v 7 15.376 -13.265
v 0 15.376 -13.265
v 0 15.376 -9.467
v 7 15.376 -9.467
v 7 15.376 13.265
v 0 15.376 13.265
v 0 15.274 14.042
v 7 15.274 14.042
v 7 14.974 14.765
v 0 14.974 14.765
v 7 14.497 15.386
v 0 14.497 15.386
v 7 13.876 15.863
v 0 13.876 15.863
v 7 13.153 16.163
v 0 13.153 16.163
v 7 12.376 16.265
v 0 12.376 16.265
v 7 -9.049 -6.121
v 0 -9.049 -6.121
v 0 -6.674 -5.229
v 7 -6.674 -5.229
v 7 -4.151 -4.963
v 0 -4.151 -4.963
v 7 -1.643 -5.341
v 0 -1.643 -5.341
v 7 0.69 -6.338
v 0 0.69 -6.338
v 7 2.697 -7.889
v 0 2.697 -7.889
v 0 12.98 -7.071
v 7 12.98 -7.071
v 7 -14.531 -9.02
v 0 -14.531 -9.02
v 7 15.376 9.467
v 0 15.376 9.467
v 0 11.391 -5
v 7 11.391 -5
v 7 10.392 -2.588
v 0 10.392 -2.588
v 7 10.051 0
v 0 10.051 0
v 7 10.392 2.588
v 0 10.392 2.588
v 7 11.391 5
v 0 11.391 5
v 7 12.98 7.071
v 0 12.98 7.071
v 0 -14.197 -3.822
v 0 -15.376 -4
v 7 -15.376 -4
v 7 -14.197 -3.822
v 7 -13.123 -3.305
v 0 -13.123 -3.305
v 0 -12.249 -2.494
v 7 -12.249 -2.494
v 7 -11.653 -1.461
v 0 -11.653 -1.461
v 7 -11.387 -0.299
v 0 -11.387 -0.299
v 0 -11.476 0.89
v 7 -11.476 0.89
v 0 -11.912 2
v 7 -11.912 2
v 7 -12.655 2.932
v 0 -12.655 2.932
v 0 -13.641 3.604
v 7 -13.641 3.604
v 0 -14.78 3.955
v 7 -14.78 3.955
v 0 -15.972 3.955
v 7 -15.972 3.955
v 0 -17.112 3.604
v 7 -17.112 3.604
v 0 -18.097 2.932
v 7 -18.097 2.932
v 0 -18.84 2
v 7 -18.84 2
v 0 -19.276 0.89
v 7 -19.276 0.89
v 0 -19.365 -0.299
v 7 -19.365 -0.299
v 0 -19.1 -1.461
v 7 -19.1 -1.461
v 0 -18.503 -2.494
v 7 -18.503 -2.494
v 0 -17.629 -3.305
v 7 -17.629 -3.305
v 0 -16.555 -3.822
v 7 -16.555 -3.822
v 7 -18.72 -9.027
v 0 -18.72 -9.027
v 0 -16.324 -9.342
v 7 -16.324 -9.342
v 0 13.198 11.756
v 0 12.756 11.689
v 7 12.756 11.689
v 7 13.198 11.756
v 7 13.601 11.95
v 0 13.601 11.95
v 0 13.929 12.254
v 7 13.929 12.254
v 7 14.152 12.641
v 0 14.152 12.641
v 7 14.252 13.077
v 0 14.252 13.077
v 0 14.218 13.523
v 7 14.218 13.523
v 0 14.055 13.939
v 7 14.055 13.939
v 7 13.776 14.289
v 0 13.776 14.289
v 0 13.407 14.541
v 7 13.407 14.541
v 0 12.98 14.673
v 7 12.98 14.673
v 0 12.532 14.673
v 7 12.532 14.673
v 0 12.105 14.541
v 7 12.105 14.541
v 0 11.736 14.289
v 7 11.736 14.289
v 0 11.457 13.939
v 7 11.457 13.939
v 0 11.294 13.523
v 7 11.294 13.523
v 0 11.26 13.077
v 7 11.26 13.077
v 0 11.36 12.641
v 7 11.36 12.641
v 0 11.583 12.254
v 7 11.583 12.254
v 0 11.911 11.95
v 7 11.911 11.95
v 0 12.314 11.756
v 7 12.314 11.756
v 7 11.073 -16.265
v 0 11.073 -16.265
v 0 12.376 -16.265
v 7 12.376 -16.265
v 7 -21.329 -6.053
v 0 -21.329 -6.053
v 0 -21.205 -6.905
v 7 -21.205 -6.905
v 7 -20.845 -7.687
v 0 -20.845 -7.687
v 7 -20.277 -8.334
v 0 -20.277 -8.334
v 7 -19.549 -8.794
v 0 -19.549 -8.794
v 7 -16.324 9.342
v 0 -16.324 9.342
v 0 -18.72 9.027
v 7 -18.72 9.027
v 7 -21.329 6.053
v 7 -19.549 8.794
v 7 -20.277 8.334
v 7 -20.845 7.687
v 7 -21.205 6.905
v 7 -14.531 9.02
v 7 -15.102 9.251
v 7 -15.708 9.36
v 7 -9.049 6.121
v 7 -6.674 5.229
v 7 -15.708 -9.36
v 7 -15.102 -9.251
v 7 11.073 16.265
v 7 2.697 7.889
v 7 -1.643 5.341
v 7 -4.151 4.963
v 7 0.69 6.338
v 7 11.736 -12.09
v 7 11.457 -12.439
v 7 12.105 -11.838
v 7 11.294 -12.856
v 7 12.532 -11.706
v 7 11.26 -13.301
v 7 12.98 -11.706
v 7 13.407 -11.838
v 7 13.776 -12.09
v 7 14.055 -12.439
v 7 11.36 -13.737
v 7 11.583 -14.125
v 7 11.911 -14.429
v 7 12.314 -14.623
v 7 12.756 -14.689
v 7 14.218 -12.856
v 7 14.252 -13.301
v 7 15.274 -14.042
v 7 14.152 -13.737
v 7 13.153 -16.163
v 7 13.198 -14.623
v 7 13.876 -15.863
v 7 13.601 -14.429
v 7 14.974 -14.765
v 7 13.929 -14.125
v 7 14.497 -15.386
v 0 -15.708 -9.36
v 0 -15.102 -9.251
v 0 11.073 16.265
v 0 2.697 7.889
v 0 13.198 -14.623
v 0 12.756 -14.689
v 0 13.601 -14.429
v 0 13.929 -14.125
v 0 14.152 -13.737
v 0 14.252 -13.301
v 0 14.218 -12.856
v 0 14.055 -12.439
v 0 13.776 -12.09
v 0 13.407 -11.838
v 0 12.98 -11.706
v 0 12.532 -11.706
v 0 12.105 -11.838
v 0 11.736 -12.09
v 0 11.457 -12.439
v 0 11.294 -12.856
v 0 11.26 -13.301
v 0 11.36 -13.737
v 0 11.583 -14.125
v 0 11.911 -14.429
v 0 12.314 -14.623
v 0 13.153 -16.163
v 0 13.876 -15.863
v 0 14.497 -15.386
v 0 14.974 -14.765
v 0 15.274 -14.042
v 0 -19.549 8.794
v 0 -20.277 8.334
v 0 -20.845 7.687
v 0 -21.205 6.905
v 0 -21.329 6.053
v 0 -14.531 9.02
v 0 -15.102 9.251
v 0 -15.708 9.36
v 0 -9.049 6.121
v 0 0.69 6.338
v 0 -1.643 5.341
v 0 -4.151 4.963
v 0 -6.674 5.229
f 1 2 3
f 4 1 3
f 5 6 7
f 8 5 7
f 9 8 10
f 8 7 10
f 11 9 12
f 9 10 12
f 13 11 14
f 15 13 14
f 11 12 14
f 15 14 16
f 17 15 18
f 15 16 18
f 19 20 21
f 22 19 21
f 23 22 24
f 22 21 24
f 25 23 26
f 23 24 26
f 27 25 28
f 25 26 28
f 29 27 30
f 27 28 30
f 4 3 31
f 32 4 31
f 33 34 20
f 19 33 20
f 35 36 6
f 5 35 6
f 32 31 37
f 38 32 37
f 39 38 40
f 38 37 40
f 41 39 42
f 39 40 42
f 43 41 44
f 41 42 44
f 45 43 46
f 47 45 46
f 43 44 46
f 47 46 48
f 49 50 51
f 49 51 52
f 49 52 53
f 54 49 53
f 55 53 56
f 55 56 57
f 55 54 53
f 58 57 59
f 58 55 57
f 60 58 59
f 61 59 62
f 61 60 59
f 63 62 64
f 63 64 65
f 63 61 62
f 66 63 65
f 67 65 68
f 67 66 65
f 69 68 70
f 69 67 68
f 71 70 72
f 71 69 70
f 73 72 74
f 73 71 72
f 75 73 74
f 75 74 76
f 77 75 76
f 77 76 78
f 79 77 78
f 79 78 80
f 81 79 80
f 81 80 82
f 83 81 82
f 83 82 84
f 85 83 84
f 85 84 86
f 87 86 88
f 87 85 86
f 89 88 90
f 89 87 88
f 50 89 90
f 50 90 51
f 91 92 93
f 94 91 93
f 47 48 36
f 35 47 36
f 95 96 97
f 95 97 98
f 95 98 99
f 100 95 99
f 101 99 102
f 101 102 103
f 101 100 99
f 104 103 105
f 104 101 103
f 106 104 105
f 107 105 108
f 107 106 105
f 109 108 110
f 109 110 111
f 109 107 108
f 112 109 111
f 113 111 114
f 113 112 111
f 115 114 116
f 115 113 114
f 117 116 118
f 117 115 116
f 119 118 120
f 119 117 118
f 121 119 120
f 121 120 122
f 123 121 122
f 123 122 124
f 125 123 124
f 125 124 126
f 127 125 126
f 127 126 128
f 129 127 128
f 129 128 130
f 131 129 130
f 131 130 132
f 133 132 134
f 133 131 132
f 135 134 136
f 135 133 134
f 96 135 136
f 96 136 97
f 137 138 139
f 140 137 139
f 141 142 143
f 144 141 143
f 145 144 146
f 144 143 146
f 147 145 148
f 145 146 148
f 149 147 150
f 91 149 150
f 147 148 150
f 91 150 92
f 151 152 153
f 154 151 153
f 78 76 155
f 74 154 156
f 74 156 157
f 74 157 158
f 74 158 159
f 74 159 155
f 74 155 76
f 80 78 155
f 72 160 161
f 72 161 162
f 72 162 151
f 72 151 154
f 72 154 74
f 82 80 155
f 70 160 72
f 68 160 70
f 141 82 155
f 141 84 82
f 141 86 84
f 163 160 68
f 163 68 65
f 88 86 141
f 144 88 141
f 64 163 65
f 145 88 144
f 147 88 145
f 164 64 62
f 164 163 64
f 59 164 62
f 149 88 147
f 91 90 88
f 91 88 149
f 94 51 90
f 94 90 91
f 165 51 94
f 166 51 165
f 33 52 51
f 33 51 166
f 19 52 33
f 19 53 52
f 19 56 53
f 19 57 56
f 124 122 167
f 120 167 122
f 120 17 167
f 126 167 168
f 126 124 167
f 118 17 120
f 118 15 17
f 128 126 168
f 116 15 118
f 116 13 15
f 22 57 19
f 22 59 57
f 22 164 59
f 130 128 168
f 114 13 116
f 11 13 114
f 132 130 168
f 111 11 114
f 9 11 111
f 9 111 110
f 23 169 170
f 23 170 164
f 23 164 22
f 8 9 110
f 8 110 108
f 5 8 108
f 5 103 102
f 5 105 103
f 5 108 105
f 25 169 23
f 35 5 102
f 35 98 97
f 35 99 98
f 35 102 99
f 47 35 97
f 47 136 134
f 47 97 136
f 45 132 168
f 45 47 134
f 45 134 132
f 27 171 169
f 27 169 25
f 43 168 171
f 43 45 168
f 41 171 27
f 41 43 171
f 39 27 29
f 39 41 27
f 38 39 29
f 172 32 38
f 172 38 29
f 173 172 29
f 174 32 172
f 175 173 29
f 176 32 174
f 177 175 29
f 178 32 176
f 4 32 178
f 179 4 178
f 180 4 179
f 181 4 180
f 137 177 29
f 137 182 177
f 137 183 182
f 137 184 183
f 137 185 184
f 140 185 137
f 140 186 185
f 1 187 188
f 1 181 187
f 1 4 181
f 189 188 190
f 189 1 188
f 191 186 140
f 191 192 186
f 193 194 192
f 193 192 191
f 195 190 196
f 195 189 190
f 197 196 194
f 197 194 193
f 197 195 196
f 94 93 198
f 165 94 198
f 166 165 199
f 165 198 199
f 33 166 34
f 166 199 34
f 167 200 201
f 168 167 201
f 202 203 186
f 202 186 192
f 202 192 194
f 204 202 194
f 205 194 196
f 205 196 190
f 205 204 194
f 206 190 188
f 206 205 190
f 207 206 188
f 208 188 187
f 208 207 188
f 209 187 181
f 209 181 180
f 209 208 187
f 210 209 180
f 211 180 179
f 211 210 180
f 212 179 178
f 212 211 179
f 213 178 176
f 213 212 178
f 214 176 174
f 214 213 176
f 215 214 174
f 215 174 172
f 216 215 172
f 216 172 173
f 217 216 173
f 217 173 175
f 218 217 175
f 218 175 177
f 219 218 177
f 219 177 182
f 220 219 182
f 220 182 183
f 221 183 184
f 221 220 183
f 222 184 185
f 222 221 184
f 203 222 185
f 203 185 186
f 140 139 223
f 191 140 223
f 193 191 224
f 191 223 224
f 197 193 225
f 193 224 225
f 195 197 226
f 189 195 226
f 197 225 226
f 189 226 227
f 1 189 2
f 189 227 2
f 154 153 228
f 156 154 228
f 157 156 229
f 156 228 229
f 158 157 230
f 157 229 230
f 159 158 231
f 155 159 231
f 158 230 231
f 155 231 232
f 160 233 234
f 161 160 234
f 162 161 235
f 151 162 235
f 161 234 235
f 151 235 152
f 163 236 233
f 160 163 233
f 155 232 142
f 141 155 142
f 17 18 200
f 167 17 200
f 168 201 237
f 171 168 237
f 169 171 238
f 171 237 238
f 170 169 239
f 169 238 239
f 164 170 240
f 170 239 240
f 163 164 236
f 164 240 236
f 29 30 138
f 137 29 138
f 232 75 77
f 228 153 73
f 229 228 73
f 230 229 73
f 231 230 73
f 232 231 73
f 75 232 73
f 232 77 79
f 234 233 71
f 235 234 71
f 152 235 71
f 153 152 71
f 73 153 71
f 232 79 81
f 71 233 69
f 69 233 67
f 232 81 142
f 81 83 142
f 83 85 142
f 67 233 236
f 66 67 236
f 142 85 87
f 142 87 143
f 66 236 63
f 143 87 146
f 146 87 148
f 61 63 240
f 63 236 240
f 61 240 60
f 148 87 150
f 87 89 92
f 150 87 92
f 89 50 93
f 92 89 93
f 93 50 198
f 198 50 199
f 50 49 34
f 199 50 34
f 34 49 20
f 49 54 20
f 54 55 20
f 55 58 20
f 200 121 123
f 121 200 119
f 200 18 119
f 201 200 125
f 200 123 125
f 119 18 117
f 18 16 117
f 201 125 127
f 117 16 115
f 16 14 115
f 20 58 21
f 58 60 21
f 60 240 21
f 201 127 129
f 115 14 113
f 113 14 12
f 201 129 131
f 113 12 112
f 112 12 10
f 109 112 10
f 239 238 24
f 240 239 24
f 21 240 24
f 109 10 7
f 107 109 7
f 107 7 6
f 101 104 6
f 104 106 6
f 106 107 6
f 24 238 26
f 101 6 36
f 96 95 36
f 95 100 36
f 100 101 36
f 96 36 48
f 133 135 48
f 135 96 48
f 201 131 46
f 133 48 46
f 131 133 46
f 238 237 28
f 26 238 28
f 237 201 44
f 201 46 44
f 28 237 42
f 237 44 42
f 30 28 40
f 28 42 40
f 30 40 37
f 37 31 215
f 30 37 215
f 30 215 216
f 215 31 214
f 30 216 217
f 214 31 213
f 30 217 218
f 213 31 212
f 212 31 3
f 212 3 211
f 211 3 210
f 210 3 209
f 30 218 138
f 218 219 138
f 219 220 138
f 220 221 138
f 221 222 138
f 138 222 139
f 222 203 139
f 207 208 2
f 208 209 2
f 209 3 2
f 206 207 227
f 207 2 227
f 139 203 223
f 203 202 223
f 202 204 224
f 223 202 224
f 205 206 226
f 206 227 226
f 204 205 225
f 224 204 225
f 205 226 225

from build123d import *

# Parameters (mm, degrees)
SKETCH1_R           = 1.5
SKETCH1_R_2         = 4
BOSS_EXTRUDE3_DEPTH = 7


with BuildPart() as part:
    # Sketch1 → Boss-Extrude3 (new body)
    with BuildSketch(Plane(origin=(0, 0, 0), x_dir=(0, 0, -1), z_dir=(1, 0, 0))):
        with BuildLine():
            Line((-16.265163927, 11.0728645), (-7.889471404, 2.697171977))
            ThreePointArc((-7.889471404, 2.697171977), (-5.072000749, -2.885001281), (-6.120829891, -9.049314431))
            Line((-6.120829891, -9.049314431), (-9.01992916, -14.530576551))
            ThreePointArc((-9.01992916, -14.530576551), (-9.320687391, -15.40241611), (-9.342398614, -16.32441847))
            Line((-9.342398614, -16.32441847), (-9.027333312, -18.719831292))
            ThreePointArc((-9.027333312, -18.719831292), (-8.031125849, -20.584013921), (-6.052951061, -21.328614951))
            Line((-6.052951061, -21.328614951), (6.052951061, -21.328614951))
            ThreePointArc((6.052951061, -21.328614951), (8.031125849, -20.584013921), (9.027333312, -18.719831292))
            Line((9.027333312, -18.719831292), (9.342398614, -16.32441847))
            ThreePointArc((9.342398614, -16.32441847), (9.320687391, -15.40241611), (9.01992916, -14.530576551))
            Line((9.01992916, -14.530576551), (6.120829891, -9.049314431))
            ThreePointArc((6.120829891, -9.049314431), (5.072000749, -2.885001281), (7.889471404, 2.697171977))
            Line((7.889471404, 2.697171977), (16.265163927, 11.0728645))
            Line((16.265163927, 11.0728645), (16.265163927, 12.376090748))
            ThreePointArc((16.265163927, 12.376090748), (15.386484271, 14.497411092), (13.265163927, 15.376090748))
            Line((13.265163927, 15.376090748), (9.467130834, 15.376090748))
            Line((9.467130834, 15.376090748), (7.071067812, 12.980027727))
            ThreePointArc((7.071067812, 12.980027727), (0, 10.051095538), (-7.071067812, 12.980027727))
            Line((-7.071067812, 12.980027727), (-9.467130834, 15.376090748))
            Line((-9.467130834, 15.376090748), (-13.265163927, 15.376090748))
            ThreePointArc((-13.265163927, 15.376090748), (-15.386484271, 14.497411092), (-16.265163927, 12.376090748))
            Line((-16.265163927, 12.376090748), (-16.265163927, 11.0728645))
        make_face()
        with Locations((-13.189368773, 12.756003002)):
            Circle(SKETCH1_R, mode=Mode.SUBTRACT)
        with Locations((13.189368773, 12.756003002)):
            Circle(SKETCH1_R, mode=Mode.SUBTRACT)
        with Locations((0, -15.376090748)):
            Circle(SKETCH1_R_2, mode=Mode.SUBTRACT)
    extrude(amount=BOSS_EXTRUDE3_DEPTH)


solid = part.part
